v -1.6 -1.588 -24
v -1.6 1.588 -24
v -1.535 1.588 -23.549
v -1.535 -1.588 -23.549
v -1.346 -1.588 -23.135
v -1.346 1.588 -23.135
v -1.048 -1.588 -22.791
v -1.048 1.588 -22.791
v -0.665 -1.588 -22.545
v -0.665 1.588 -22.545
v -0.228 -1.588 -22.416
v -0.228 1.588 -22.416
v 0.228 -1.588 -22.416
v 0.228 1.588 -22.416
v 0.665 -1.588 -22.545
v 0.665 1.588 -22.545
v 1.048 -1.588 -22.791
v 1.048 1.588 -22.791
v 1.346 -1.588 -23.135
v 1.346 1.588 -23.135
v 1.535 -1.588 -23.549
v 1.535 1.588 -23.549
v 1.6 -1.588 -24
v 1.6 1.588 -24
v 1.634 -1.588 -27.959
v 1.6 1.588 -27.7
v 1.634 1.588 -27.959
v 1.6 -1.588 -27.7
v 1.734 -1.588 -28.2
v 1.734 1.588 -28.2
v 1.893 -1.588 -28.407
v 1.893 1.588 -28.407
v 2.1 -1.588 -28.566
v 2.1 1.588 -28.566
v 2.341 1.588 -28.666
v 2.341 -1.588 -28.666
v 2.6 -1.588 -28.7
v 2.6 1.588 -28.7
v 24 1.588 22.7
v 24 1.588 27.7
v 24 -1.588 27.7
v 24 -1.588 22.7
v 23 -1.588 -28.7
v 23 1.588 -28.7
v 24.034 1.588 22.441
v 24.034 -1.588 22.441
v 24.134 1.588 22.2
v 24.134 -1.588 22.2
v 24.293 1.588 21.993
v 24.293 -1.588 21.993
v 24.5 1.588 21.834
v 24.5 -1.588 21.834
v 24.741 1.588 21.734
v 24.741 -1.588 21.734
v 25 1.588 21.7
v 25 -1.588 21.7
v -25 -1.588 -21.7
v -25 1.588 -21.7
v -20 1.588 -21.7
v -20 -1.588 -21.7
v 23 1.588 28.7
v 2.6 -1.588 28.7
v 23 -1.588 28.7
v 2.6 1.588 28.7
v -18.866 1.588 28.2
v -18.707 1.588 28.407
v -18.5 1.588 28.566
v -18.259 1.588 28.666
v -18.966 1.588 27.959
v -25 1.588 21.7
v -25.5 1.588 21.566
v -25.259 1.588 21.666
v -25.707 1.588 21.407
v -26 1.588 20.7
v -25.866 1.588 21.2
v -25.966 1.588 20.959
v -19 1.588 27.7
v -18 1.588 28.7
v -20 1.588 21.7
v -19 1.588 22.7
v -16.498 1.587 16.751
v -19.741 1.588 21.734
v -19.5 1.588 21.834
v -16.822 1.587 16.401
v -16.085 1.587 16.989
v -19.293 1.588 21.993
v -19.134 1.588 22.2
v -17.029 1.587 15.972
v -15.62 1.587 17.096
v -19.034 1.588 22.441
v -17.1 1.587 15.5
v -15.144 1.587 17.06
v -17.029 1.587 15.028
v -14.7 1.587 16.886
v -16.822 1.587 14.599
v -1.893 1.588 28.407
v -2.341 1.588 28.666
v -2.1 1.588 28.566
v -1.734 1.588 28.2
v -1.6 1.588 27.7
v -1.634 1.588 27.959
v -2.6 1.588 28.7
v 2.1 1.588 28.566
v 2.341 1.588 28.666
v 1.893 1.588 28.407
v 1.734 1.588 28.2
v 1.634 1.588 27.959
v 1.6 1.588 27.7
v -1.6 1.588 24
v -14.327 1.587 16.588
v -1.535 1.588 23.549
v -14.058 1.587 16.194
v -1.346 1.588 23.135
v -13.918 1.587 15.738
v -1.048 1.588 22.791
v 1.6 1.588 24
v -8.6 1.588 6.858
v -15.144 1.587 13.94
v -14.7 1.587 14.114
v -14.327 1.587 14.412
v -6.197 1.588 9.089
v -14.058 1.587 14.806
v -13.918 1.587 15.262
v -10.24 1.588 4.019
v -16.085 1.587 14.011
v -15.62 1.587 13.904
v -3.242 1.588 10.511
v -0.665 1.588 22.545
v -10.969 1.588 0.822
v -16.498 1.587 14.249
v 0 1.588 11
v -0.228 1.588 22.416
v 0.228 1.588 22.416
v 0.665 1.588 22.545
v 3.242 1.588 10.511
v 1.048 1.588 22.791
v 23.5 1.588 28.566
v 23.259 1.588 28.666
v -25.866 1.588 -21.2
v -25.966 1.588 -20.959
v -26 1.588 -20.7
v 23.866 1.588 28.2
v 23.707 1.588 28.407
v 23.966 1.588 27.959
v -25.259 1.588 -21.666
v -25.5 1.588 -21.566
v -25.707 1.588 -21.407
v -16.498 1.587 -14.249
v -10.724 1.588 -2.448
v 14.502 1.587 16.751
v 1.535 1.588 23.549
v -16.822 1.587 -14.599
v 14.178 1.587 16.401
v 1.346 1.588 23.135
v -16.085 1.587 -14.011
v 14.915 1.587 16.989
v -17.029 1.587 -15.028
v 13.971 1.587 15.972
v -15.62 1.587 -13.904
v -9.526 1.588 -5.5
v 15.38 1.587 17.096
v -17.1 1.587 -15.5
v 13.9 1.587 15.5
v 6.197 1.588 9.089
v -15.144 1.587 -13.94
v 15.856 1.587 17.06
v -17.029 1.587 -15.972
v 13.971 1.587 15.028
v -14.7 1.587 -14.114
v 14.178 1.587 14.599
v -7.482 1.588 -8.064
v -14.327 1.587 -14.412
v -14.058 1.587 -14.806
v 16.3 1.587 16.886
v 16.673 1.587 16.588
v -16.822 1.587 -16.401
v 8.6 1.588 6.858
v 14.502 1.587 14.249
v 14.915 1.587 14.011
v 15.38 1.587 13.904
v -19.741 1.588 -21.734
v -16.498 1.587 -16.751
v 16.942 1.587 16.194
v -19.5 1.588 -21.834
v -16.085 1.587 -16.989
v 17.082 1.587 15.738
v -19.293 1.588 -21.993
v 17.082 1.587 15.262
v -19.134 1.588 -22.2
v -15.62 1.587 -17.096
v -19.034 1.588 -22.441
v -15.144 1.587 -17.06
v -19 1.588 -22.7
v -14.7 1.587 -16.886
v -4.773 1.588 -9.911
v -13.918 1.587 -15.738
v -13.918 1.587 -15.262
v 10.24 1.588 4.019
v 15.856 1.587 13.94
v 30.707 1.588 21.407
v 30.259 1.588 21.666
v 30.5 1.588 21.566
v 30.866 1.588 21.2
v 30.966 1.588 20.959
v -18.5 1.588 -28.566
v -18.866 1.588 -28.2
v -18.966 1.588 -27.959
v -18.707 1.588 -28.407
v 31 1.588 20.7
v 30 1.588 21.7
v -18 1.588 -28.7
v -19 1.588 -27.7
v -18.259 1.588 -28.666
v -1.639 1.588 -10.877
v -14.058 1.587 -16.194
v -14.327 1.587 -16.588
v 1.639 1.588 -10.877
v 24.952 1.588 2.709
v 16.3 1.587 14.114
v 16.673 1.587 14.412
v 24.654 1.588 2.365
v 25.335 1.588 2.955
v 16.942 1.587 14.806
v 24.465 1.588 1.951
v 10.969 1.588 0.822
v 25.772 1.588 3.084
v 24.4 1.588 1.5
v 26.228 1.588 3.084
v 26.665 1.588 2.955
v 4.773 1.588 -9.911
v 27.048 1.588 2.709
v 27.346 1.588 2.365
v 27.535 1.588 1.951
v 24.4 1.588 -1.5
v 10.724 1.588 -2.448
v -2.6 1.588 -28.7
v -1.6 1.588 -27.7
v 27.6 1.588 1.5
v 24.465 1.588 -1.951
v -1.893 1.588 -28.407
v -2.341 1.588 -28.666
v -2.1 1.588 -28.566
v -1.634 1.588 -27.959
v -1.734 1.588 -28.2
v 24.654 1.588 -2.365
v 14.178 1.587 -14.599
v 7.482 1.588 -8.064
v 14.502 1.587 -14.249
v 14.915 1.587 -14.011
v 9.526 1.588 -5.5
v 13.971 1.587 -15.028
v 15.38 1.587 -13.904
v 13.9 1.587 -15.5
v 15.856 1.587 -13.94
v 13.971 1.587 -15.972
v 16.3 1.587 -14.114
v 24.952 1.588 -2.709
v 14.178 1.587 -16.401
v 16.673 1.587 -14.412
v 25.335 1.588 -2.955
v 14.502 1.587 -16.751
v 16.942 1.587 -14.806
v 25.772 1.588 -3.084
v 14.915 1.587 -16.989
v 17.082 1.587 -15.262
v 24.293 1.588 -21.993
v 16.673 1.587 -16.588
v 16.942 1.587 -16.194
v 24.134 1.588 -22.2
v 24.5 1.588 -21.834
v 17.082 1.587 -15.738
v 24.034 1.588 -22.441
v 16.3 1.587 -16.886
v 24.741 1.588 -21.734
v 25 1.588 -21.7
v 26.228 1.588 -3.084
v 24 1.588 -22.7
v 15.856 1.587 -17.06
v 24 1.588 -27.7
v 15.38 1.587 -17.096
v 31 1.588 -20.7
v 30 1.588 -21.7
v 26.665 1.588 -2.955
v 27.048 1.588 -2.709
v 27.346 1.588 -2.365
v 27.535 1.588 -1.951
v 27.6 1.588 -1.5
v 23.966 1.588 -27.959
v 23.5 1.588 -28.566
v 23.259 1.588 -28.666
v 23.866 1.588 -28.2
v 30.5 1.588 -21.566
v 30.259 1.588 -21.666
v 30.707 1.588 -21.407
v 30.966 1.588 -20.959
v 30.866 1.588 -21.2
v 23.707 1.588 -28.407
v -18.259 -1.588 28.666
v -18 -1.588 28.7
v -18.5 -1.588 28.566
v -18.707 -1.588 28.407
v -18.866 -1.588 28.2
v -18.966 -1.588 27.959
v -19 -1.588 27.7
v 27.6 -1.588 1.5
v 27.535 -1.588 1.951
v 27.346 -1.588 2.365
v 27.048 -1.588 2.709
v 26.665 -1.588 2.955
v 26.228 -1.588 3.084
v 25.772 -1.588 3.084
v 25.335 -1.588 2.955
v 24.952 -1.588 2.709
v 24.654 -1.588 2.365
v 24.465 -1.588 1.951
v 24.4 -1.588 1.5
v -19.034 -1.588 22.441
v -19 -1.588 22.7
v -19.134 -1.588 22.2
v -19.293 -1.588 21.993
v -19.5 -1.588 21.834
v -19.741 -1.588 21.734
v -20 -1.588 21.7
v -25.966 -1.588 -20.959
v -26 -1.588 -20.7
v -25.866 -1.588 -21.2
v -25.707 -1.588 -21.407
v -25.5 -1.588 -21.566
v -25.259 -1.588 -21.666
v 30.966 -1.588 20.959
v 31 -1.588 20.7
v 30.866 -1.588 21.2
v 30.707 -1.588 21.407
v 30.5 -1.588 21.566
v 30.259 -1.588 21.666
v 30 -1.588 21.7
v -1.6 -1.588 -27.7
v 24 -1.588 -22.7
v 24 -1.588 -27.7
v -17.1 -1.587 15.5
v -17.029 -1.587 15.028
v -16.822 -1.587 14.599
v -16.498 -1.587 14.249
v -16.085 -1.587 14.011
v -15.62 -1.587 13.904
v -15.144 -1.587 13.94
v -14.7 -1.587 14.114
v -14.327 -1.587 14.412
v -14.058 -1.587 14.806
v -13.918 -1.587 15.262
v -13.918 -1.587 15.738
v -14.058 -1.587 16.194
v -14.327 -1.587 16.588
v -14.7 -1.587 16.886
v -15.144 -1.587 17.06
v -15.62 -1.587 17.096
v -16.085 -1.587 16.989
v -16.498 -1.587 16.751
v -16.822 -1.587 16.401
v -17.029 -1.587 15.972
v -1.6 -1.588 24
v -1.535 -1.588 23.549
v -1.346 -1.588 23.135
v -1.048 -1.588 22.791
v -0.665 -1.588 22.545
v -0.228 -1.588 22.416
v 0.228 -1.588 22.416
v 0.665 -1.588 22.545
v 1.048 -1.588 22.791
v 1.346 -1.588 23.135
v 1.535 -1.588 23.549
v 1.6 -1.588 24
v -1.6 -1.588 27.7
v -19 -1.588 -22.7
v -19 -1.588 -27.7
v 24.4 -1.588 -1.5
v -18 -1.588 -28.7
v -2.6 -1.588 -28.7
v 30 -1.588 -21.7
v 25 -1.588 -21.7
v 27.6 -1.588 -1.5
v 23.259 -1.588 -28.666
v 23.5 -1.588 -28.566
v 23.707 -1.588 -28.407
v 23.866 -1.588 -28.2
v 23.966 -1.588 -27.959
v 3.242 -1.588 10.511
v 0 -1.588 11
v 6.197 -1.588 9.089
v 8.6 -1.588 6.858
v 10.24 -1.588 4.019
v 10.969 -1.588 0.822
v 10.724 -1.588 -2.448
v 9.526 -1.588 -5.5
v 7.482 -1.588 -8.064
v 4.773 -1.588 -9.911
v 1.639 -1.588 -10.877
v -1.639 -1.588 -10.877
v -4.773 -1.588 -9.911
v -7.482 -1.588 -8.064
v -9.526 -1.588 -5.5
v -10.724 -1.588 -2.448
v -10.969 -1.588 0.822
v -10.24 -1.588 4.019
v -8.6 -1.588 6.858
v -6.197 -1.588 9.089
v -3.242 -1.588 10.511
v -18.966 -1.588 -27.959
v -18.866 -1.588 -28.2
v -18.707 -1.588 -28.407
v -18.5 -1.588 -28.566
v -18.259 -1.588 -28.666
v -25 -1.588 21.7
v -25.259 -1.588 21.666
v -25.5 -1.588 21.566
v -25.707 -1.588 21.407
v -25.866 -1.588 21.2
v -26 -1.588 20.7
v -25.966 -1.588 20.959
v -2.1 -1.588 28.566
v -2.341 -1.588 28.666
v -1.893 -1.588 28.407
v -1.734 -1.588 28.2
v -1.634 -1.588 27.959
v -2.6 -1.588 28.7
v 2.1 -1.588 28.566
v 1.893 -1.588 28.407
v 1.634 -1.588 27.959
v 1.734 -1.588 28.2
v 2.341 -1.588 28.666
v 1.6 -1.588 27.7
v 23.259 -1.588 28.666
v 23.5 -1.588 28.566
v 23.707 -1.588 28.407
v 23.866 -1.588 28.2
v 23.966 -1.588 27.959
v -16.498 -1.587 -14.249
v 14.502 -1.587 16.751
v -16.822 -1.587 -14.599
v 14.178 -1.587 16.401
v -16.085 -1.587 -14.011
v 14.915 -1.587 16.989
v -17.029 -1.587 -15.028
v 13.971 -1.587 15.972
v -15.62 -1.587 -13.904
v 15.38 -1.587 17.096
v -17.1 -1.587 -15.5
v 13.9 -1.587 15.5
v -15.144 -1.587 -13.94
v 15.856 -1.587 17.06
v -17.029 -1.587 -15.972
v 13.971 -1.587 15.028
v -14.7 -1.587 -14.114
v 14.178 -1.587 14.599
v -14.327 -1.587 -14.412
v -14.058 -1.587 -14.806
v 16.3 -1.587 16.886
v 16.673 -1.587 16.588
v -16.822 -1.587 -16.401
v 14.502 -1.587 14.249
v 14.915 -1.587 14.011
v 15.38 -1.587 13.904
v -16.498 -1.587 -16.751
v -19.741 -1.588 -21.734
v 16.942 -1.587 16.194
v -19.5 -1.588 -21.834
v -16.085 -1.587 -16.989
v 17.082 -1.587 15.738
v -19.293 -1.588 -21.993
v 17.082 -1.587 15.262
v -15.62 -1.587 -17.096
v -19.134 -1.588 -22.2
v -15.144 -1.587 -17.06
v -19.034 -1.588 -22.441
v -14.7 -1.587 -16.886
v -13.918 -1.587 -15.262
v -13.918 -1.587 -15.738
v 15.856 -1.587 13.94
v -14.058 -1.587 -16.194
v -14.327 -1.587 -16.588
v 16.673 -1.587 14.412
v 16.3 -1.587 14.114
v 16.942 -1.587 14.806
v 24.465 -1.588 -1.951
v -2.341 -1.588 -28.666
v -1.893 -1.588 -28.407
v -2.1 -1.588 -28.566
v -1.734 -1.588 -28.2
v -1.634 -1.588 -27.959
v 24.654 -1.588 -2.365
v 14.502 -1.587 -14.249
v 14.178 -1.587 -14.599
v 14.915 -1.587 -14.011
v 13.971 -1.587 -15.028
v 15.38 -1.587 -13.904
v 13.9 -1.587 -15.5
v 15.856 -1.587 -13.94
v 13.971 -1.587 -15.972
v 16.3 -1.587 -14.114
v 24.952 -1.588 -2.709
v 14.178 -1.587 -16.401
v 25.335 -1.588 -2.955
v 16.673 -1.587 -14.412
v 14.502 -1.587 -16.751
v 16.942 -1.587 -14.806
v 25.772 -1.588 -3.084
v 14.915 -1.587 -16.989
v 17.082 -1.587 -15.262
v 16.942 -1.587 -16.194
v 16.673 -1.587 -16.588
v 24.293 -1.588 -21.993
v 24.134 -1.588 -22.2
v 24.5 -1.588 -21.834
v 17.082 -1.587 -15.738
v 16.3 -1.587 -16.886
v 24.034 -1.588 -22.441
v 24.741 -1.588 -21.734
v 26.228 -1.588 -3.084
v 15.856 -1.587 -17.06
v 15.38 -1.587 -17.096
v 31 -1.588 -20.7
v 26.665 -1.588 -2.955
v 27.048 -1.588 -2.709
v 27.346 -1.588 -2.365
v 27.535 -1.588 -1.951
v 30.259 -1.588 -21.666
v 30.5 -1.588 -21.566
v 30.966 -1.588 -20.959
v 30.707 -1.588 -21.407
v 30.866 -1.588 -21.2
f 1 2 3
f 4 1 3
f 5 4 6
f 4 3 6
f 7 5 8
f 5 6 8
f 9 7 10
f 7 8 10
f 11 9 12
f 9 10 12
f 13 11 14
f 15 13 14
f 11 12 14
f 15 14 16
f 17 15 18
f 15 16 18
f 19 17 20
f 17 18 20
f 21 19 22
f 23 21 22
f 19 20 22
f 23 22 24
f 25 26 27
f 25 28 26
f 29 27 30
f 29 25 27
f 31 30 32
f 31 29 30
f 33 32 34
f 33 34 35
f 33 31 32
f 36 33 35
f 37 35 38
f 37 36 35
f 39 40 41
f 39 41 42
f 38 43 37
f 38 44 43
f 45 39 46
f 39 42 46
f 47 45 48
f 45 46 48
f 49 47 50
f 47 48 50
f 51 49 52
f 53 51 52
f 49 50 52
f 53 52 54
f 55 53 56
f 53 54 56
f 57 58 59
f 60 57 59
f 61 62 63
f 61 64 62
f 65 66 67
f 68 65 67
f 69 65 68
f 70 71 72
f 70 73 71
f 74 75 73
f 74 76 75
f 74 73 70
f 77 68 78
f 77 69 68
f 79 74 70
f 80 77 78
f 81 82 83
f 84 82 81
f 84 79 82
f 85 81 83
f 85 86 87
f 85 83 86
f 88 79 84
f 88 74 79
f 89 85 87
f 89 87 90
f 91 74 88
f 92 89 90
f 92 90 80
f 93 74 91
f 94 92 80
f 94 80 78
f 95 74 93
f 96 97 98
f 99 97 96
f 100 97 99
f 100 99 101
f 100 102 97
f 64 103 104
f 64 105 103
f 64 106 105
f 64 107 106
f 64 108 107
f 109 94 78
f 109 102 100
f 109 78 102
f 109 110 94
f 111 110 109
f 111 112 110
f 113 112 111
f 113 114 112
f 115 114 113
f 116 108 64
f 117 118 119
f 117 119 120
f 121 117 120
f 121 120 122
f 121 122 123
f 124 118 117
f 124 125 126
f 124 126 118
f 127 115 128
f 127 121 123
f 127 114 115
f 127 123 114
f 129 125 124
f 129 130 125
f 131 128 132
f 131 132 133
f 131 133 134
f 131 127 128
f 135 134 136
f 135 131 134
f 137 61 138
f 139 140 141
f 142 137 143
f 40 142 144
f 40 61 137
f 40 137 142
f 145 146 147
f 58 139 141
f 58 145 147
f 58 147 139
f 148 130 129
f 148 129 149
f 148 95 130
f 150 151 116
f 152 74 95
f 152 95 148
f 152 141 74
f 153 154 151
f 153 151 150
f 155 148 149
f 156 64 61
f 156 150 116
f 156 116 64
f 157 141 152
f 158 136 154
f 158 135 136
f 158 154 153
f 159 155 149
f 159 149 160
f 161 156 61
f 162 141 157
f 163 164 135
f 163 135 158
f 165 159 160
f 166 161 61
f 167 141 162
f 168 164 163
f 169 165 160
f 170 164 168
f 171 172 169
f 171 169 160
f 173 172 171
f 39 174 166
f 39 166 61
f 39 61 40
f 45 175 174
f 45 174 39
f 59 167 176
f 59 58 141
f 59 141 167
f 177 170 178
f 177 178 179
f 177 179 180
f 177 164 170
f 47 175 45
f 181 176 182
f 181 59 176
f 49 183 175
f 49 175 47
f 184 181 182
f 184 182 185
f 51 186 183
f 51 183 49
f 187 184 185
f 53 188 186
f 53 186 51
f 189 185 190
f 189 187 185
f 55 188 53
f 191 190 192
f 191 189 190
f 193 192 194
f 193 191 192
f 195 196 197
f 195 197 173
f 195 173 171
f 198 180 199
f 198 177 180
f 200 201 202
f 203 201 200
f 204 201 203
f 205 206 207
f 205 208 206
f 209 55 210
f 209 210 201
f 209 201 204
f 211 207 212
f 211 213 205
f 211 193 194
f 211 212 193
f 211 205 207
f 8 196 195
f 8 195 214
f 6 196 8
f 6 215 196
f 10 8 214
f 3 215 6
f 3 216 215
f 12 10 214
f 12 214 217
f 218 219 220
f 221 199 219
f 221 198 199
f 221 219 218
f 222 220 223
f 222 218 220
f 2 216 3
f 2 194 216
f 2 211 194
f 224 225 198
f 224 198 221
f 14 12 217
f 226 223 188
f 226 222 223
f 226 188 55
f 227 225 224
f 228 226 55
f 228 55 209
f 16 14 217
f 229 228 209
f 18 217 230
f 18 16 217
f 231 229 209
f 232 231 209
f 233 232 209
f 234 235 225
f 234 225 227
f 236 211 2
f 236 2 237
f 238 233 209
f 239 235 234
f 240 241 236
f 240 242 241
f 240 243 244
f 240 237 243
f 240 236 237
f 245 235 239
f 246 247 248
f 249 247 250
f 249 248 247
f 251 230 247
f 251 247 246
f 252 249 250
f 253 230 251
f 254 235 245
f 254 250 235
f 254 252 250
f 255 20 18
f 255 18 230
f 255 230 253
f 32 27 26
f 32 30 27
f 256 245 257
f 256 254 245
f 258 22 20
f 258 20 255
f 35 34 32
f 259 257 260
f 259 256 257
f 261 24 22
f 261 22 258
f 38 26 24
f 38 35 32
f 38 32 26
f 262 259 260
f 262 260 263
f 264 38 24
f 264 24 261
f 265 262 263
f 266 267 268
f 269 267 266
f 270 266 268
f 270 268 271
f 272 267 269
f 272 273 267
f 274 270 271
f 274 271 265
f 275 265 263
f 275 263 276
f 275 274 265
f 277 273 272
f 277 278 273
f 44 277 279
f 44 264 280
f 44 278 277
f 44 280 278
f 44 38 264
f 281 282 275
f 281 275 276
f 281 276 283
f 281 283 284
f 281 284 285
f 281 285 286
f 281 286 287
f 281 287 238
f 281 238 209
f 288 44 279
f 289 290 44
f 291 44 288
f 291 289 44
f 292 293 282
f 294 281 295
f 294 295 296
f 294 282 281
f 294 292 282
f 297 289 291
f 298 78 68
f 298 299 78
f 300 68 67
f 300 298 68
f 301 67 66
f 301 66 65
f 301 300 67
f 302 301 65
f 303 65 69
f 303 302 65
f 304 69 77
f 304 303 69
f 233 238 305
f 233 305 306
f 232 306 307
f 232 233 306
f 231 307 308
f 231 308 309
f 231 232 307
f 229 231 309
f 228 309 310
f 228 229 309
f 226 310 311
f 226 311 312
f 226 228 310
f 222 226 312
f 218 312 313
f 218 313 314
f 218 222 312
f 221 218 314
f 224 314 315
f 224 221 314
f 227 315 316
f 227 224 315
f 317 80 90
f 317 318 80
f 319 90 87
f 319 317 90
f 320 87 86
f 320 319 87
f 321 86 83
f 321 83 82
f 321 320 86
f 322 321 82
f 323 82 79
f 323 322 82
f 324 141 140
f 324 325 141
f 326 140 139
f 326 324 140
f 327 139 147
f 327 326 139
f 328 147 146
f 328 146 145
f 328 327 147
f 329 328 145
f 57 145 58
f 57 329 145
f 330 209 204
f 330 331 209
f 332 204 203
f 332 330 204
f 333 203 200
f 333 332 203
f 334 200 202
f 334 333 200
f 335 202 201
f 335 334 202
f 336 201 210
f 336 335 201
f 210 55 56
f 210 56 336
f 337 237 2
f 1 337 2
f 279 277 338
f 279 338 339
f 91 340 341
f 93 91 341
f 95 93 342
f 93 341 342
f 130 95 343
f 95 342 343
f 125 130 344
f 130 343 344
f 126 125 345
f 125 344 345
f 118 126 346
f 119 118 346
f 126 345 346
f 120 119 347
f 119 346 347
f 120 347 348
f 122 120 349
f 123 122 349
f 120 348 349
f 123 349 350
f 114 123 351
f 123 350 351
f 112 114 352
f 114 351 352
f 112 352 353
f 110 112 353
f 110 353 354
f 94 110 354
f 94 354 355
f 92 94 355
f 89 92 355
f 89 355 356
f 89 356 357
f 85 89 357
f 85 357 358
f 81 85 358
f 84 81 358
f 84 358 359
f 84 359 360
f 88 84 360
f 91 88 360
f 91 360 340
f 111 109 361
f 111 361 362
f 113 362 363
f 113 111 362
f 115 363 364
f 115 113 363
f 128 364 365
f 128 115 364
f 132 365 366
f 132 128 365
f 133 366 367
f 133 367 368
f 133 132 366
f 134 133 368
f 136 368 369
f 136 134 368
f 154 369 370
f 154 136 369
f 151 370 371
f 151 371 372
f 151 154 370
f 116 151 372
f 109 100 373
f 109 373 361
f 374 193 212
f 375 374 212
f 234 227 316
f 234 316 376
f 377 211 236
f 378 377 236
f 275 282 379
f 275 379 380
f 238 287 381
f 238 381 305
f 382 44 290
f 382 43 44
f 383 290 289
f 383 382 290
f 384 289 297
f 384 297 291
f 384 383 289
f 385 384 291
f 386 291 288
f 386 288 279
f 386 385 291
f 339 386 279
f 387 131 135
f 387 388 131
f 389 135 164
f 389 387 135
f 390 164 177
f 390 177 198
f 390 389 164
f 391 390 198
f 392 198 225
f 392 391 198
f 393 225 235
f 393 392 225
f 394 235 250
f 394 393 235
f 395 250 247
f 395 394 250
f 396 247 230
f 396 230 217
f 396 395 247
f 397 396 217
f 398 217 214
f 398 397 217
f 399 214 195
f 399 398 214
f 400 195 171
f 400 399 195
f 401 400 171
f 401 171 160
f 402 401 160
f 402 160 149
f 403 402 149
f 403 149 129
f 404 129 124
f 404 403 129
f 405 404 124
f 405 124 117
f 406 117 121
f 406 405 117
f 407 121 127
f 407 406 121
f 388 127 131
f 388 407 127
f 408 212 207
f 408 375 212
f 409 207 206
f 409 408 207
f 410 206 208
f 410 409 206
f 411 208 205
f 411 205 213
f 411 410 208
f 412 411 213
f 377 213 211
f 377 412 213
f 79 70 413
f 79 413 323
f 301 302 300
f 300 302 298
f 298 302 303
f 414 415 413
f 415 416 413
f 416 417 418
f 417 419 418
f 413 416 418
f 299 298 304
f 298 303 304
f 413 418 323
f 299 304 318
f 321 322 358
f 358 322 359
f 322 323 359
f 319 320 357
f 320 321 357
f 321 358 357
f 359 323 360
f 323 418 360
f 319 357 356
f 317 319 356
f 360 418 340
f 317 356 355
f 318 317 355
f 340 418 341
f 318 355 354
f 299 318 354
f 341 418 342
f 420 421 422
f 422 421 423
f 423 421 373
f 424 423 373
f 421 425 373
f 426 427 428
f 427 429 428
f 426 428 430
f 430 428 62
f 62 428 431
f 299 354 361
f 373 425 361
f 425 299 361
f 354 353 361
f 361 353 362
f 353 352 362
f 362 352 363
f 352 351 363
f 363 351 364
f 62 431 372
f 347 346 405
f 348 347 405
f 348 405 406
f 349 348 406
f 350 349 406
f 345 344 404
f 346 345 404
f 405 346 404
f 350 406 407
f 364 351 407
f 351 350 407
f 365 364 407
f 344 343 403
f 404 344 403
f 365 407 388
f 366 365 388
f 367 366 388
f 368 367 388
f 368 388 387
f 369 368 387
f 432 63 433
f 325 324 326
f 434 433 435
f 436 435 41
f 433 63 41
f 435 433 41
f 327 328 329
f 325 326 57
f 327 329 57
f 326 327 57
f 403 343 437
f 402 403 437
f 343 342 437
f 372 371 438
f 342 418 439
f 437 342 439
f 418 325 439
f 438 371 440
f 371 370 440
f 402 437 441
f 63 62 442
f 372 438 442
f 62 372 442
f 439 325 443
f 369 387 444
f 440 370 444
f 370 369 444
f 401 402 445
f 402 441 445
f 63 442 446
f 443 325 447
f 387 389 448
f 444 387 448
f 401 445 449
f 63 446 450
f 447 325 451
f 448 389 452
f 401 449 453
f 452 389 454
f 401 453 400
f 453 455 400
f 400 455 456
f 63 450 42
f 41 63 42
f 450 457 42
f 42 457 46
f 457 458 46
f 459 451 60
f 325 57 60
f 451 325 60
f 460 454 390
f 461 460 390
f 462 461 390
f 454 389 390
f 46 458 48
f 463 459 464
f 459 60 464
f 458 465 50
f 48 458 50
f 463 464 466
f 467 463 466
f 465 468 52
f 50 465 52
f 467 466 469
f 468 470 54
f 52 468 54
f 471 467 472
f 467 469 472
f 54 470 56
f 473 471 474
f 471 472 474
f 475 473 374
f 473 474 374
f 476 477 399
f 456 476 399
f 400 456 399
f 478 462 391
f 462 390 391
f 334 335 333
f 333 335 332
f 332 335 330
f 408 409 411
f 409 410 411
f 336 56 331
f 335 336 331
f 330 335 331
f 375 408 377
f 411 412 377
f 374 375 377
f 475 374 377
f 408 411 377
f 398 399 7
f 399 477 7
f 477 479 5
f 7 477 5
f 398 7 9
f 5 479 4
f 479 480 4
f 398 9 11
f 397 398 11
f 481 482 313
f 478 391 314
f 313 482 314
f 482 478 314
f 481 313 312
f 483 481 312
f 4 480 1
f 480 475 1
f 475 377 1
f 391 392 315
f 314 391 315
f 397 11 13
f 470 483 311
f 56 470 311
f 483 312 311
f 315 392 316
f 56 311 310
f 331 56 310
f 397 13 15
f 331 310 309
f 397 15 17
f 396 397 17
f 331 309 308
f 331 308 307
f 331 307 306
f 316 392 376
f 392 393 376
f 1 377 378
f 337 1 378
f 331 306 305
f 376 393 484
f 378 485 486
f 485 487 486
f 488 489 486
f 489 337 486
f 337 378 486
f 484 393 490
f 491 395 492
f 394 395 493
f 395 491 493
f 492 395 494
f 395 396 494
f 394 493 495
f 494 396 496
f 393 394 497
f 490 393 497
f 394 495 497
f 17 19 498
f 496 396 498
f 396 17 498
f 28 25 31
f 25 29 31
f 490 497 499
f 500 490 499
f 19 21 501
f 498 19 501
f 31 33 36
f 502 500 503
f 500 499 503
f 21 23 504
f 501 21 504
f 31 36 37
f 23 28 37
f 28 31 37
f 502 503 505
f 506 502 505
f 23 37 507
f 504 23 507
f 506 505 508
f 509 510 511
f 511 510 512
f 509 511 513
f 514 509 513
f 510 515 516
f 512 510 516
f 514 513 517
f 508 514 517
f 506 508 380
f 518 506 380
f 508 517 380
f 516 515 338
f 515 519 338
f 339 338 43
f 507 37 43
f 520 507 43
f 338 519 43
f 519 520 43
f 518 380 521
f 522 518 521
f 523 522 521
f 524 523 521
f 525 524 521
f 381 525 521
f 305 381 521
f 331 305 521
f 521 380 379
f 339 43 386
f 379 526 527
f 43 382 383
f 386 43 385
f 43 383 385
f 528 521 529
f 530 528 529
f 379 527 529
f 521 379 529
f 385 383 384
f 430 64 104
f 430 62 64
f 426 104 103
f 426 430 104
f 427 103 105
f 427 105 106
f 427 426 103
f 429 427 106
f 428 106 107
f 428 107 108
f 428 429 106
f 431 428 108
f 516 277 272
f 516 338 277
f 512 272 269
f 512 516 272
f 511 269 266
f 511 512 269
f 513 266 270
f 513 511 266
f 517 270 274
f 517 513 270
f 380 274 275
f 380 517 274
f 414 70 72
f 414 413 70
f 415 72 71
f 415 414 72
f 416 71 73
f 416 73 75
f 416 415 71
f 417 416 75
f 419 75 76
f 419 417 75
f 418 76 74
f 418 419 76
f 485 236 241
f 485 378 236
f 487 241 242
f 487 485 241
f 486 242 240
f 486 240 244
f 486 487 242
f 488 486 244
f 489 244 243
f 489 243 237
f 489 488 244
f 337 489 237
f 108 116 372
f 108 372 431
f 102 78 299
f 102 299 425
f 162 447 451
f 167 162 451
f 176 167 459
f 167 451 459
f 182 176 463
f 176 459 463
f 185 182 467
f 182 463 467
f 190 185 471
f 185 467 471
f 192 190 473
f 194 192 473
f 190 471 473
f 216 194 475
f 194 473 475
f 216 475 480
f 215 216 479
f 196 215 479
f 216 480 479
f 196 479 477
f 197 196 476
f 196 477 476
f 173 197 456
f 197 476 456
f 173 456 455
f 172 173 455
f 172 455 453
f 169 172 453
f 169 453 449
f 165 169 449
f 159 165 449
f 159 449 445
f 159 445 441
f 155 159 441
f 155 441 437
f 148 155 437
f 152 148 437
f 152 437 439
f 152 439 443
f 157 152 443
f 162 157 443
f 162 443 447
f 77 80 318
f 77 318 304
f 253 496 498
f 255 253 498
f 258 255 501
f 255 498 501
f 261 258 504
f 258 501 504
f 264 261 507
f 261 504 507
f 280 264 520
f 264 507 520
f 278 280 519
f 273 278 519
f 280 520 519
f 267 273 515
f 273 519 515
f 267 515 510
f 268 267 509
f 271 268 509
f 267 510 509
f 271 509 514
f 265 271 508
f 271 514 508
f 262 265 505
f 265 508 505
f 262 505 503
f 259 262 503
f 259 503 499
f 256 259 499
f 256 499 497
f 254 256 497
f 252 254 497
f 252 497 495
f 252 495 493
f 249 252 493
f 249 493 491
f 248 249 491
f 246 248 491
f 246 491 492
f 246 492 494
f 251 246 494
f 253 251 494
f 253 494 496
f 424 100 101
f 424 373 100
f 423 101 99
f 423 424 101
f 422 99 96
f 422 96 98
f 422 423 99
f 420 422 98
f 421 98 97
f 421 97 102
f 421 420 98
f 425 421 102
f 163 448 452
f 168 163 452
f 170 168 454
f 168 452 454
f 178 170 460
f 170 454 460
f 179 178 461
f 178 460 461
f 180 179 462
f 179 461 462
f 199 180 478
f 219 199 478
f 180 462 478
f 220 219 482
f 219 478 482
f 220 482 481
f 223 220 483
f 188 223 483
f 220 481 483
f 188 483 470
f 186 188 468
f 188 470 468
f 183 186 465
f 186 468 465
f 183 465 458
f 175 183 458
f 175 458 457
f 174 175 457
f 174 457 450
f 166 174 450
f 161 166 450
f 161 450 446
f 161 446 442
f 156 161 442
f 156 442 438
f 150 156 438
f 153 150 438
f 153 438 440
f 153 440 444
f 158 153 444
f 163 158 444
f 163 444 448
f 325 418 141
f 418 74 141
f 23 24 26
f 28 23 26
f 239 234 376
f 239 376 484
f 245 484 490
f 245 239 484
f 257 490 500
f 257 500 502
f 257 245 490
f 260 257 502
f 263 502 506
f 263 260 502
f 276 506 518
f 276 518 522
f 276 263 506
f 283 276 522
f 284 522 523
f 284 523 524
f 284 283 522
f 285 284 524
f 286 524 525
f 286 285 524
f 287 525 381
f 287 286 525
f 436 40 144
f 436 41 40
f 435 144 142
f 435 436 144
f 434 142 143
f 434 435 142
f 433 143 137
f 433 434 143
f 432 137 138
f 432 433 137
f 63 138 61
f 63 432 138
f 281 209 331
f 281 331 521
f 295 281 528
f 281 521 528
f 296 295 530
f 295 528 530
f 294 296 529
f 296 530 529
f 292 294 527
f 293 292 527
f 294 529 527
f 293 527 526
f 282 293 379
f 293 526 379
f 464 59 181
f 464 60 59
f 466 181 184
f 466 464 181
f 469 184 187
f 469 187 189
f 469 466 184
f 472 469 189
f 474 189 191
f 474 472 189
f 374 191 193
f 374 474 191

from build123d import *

# Parameters (mm, degrees)
SKETCH1_W            = 42
SKETCH1_H            = 42
SKETCH1_R            = 11
BOSS_EXTRUDE1_DEPTH  = 1.5875
M3_CLEARANCE_HOLE1_D = 3.2
SKETCH4_W            = 5
SKETCH4_H            = 42
SKETCH4_W_2          = 10
SKETCH4_H_2          = 28
BOSS_EXTRUDE2_DEPTH  = 3.175
SKETCH5_W            = 7
SKETCH5_H            = 0.7
BOSS_EXTRUDE3_DEPTH  = 3.175
FILLET1_R            = 1


with BuildPart() as part:
    # Sketch1 → Boss-Extrude1 (new, symmetric)
    with BuildSketch(Plane(origin=(0, 0, 0), x_dir=(1, 0, 0), z_dir=(0, 1, 0))):
        Rectangle(SKETCH1_W, SKETCH1_H)
        with Locations(Location((0, 0, 0), (0, 0, 270))):
            Circle(SKETCH1_R, mode=Mode.SUBTRACT)
    extrude(amount=BOSS_EXTRUDE1_DEPTH, both=True)

    # M3 Clearance Hole1 (through all)
    with Locations(Plane(origin=(0, 1.5875, 0), x_dir=(1, 0, 0), z_dir=(0, 1, 0))):
        with Locations((-15.5, 15.5), (15.5, 15.5), (15.5, -15.5), (-15.5, -15.5)):
            Hole(M3_CLEARANCE_HOLE1_D / 2)

    # Sketch4 → Boss-Extrude2 (add)
    # profile 1 of 4: a face of its own
    with BuildSketch(Plane(origin=(0, 1.5875, 0), x_dir=(1, 0, 0), z_dir=(0, 1, 0))):
        with BuildLine():
            Line((1.6, -24), (1.6, -28.7))
            Line((1.6, -28.7), (14, -28.7))
            Line((14, -28.7), (14, -21))
            Line((14, -21), (-19, -21))
            Line((-19, -21), (-19, -28.7))
            Line((-19, -28.7), (-1.6, -28.7))
            Line((-1.6, -28.7), (-1.6, -24))
            ThreePointArc((-1.6, -24), (0, -22.4), (1.6, -24))
        make_face()
    # profile 2 of 4: a face of its own
    with BuildSketch(Plane(origin=(0, 1.5875, 0), x_dir=(1, 0, 0), z_dir=(0, 1, 0))):
        with Locations((-23.5, 0)):
            Rectangle(SKETCH4_W, SKETCH4_H)
    # profile 3 of 4: a face of its own
    with BuildSketch(Plane(origin=(0, 1.5875, 0), x_dir=(1, 0, 0), z_dir=(0, 1, 0))):
        with BuildLine():
            Line((1.6, 28.7), (14, 28.7))
            Line((14, 28.7), (14, 21))
            Line((14, 21), (-19, 21))
            Line((-19, 21), (-19, 28.7))
            Line((-19, 28.7), (-1.6, 28.7))
            Line((-1.6, 28.7), (-1.6, 24))
            ThreePointArc((-1.6, 24), (0, 22.4), (1.6, 24))
            Line((1.6, 24), (1.6, 28.7))
        make_face()
    # profile 4 of 4: a face of its own
    with BuildSketch(Plane(origin=(0, 1.5875, 0), x_dir=(1, 0, 0), z_dir=(0, 1, 0))):
        with Locations((26, 0)):
            Rectangle(SKETCH4_W_2, SKETCH4_H_2)
        with BuildLine():
            Line((27.6, 1.5), (27.6, -1.5))
            ThreePointArc((27.6, -1.5), (26, -3.1), (24.4, -1.5))
            Line((24.4, -1.5), (24.4, 1.5))
            ThreePointArc((24.4, 1.5), (26, 3.1), (27.6, 1.5))
        make_face(mode=Mode.SUBTRACT)
    extrude(amount=-BOSS_EXTRUDE2_DEPTH)

    # Sketch5 → Boss-Extrude3 (add)
    with BuildSketch(Plane(origin=(0, 1.5875, 0), x_dir=(1, 0, 0), z_dir=(0, 1, 0))):
        Polygon((21, 14), (31, 14), (31, 21.7), (24, 21.7), (24, 28.7), (14, 28.7), (14, 21), (21, 21), align=None)
        Polygon((31, -14), (21, -14), (21, -21), (14, -21), (14, -28.7), (24, -28.7), (24, -21.7), (31, -21.7), align=None)
        with Locations((-22.5, -21.35)):
            Rectangle(SKETCH5_W, SKETCH5_H)
        with Locations((-22.5, 21.35)):
            Rectangle(SKETCH5_W, SKETCH5_H)
    extrude(amount=-BOSS_EXTRUDE3_DEPTH)

    # Fillet1
    fillet1_edges = [part.edges().sort_by_distance(p)[0] for p in [
        (-26, 0, 21.7),
        (31, 0, -21.7),
        (-19, 0, -21.7),
        (24, 0, -28.7),
        (24, 0, -21.7),
        (31, 0, 21.7),
        (24, 0, 21.7),
        (24, 0, 28.7),
        (-19, 0, 21.7),
        (-26, 0, -21.7),
        (-1.6, 0, 28.7),
        (-19, 0, 28.7),
        (1.6, 0, 28.7),
        (1.6, 0, -28.7),
        (-19, 0, -28.7),
        (-1.6, 0, -28.7),
    ]]
    fillet(fillet1_edges, radius=FILLET1_R)


solid = part.part
